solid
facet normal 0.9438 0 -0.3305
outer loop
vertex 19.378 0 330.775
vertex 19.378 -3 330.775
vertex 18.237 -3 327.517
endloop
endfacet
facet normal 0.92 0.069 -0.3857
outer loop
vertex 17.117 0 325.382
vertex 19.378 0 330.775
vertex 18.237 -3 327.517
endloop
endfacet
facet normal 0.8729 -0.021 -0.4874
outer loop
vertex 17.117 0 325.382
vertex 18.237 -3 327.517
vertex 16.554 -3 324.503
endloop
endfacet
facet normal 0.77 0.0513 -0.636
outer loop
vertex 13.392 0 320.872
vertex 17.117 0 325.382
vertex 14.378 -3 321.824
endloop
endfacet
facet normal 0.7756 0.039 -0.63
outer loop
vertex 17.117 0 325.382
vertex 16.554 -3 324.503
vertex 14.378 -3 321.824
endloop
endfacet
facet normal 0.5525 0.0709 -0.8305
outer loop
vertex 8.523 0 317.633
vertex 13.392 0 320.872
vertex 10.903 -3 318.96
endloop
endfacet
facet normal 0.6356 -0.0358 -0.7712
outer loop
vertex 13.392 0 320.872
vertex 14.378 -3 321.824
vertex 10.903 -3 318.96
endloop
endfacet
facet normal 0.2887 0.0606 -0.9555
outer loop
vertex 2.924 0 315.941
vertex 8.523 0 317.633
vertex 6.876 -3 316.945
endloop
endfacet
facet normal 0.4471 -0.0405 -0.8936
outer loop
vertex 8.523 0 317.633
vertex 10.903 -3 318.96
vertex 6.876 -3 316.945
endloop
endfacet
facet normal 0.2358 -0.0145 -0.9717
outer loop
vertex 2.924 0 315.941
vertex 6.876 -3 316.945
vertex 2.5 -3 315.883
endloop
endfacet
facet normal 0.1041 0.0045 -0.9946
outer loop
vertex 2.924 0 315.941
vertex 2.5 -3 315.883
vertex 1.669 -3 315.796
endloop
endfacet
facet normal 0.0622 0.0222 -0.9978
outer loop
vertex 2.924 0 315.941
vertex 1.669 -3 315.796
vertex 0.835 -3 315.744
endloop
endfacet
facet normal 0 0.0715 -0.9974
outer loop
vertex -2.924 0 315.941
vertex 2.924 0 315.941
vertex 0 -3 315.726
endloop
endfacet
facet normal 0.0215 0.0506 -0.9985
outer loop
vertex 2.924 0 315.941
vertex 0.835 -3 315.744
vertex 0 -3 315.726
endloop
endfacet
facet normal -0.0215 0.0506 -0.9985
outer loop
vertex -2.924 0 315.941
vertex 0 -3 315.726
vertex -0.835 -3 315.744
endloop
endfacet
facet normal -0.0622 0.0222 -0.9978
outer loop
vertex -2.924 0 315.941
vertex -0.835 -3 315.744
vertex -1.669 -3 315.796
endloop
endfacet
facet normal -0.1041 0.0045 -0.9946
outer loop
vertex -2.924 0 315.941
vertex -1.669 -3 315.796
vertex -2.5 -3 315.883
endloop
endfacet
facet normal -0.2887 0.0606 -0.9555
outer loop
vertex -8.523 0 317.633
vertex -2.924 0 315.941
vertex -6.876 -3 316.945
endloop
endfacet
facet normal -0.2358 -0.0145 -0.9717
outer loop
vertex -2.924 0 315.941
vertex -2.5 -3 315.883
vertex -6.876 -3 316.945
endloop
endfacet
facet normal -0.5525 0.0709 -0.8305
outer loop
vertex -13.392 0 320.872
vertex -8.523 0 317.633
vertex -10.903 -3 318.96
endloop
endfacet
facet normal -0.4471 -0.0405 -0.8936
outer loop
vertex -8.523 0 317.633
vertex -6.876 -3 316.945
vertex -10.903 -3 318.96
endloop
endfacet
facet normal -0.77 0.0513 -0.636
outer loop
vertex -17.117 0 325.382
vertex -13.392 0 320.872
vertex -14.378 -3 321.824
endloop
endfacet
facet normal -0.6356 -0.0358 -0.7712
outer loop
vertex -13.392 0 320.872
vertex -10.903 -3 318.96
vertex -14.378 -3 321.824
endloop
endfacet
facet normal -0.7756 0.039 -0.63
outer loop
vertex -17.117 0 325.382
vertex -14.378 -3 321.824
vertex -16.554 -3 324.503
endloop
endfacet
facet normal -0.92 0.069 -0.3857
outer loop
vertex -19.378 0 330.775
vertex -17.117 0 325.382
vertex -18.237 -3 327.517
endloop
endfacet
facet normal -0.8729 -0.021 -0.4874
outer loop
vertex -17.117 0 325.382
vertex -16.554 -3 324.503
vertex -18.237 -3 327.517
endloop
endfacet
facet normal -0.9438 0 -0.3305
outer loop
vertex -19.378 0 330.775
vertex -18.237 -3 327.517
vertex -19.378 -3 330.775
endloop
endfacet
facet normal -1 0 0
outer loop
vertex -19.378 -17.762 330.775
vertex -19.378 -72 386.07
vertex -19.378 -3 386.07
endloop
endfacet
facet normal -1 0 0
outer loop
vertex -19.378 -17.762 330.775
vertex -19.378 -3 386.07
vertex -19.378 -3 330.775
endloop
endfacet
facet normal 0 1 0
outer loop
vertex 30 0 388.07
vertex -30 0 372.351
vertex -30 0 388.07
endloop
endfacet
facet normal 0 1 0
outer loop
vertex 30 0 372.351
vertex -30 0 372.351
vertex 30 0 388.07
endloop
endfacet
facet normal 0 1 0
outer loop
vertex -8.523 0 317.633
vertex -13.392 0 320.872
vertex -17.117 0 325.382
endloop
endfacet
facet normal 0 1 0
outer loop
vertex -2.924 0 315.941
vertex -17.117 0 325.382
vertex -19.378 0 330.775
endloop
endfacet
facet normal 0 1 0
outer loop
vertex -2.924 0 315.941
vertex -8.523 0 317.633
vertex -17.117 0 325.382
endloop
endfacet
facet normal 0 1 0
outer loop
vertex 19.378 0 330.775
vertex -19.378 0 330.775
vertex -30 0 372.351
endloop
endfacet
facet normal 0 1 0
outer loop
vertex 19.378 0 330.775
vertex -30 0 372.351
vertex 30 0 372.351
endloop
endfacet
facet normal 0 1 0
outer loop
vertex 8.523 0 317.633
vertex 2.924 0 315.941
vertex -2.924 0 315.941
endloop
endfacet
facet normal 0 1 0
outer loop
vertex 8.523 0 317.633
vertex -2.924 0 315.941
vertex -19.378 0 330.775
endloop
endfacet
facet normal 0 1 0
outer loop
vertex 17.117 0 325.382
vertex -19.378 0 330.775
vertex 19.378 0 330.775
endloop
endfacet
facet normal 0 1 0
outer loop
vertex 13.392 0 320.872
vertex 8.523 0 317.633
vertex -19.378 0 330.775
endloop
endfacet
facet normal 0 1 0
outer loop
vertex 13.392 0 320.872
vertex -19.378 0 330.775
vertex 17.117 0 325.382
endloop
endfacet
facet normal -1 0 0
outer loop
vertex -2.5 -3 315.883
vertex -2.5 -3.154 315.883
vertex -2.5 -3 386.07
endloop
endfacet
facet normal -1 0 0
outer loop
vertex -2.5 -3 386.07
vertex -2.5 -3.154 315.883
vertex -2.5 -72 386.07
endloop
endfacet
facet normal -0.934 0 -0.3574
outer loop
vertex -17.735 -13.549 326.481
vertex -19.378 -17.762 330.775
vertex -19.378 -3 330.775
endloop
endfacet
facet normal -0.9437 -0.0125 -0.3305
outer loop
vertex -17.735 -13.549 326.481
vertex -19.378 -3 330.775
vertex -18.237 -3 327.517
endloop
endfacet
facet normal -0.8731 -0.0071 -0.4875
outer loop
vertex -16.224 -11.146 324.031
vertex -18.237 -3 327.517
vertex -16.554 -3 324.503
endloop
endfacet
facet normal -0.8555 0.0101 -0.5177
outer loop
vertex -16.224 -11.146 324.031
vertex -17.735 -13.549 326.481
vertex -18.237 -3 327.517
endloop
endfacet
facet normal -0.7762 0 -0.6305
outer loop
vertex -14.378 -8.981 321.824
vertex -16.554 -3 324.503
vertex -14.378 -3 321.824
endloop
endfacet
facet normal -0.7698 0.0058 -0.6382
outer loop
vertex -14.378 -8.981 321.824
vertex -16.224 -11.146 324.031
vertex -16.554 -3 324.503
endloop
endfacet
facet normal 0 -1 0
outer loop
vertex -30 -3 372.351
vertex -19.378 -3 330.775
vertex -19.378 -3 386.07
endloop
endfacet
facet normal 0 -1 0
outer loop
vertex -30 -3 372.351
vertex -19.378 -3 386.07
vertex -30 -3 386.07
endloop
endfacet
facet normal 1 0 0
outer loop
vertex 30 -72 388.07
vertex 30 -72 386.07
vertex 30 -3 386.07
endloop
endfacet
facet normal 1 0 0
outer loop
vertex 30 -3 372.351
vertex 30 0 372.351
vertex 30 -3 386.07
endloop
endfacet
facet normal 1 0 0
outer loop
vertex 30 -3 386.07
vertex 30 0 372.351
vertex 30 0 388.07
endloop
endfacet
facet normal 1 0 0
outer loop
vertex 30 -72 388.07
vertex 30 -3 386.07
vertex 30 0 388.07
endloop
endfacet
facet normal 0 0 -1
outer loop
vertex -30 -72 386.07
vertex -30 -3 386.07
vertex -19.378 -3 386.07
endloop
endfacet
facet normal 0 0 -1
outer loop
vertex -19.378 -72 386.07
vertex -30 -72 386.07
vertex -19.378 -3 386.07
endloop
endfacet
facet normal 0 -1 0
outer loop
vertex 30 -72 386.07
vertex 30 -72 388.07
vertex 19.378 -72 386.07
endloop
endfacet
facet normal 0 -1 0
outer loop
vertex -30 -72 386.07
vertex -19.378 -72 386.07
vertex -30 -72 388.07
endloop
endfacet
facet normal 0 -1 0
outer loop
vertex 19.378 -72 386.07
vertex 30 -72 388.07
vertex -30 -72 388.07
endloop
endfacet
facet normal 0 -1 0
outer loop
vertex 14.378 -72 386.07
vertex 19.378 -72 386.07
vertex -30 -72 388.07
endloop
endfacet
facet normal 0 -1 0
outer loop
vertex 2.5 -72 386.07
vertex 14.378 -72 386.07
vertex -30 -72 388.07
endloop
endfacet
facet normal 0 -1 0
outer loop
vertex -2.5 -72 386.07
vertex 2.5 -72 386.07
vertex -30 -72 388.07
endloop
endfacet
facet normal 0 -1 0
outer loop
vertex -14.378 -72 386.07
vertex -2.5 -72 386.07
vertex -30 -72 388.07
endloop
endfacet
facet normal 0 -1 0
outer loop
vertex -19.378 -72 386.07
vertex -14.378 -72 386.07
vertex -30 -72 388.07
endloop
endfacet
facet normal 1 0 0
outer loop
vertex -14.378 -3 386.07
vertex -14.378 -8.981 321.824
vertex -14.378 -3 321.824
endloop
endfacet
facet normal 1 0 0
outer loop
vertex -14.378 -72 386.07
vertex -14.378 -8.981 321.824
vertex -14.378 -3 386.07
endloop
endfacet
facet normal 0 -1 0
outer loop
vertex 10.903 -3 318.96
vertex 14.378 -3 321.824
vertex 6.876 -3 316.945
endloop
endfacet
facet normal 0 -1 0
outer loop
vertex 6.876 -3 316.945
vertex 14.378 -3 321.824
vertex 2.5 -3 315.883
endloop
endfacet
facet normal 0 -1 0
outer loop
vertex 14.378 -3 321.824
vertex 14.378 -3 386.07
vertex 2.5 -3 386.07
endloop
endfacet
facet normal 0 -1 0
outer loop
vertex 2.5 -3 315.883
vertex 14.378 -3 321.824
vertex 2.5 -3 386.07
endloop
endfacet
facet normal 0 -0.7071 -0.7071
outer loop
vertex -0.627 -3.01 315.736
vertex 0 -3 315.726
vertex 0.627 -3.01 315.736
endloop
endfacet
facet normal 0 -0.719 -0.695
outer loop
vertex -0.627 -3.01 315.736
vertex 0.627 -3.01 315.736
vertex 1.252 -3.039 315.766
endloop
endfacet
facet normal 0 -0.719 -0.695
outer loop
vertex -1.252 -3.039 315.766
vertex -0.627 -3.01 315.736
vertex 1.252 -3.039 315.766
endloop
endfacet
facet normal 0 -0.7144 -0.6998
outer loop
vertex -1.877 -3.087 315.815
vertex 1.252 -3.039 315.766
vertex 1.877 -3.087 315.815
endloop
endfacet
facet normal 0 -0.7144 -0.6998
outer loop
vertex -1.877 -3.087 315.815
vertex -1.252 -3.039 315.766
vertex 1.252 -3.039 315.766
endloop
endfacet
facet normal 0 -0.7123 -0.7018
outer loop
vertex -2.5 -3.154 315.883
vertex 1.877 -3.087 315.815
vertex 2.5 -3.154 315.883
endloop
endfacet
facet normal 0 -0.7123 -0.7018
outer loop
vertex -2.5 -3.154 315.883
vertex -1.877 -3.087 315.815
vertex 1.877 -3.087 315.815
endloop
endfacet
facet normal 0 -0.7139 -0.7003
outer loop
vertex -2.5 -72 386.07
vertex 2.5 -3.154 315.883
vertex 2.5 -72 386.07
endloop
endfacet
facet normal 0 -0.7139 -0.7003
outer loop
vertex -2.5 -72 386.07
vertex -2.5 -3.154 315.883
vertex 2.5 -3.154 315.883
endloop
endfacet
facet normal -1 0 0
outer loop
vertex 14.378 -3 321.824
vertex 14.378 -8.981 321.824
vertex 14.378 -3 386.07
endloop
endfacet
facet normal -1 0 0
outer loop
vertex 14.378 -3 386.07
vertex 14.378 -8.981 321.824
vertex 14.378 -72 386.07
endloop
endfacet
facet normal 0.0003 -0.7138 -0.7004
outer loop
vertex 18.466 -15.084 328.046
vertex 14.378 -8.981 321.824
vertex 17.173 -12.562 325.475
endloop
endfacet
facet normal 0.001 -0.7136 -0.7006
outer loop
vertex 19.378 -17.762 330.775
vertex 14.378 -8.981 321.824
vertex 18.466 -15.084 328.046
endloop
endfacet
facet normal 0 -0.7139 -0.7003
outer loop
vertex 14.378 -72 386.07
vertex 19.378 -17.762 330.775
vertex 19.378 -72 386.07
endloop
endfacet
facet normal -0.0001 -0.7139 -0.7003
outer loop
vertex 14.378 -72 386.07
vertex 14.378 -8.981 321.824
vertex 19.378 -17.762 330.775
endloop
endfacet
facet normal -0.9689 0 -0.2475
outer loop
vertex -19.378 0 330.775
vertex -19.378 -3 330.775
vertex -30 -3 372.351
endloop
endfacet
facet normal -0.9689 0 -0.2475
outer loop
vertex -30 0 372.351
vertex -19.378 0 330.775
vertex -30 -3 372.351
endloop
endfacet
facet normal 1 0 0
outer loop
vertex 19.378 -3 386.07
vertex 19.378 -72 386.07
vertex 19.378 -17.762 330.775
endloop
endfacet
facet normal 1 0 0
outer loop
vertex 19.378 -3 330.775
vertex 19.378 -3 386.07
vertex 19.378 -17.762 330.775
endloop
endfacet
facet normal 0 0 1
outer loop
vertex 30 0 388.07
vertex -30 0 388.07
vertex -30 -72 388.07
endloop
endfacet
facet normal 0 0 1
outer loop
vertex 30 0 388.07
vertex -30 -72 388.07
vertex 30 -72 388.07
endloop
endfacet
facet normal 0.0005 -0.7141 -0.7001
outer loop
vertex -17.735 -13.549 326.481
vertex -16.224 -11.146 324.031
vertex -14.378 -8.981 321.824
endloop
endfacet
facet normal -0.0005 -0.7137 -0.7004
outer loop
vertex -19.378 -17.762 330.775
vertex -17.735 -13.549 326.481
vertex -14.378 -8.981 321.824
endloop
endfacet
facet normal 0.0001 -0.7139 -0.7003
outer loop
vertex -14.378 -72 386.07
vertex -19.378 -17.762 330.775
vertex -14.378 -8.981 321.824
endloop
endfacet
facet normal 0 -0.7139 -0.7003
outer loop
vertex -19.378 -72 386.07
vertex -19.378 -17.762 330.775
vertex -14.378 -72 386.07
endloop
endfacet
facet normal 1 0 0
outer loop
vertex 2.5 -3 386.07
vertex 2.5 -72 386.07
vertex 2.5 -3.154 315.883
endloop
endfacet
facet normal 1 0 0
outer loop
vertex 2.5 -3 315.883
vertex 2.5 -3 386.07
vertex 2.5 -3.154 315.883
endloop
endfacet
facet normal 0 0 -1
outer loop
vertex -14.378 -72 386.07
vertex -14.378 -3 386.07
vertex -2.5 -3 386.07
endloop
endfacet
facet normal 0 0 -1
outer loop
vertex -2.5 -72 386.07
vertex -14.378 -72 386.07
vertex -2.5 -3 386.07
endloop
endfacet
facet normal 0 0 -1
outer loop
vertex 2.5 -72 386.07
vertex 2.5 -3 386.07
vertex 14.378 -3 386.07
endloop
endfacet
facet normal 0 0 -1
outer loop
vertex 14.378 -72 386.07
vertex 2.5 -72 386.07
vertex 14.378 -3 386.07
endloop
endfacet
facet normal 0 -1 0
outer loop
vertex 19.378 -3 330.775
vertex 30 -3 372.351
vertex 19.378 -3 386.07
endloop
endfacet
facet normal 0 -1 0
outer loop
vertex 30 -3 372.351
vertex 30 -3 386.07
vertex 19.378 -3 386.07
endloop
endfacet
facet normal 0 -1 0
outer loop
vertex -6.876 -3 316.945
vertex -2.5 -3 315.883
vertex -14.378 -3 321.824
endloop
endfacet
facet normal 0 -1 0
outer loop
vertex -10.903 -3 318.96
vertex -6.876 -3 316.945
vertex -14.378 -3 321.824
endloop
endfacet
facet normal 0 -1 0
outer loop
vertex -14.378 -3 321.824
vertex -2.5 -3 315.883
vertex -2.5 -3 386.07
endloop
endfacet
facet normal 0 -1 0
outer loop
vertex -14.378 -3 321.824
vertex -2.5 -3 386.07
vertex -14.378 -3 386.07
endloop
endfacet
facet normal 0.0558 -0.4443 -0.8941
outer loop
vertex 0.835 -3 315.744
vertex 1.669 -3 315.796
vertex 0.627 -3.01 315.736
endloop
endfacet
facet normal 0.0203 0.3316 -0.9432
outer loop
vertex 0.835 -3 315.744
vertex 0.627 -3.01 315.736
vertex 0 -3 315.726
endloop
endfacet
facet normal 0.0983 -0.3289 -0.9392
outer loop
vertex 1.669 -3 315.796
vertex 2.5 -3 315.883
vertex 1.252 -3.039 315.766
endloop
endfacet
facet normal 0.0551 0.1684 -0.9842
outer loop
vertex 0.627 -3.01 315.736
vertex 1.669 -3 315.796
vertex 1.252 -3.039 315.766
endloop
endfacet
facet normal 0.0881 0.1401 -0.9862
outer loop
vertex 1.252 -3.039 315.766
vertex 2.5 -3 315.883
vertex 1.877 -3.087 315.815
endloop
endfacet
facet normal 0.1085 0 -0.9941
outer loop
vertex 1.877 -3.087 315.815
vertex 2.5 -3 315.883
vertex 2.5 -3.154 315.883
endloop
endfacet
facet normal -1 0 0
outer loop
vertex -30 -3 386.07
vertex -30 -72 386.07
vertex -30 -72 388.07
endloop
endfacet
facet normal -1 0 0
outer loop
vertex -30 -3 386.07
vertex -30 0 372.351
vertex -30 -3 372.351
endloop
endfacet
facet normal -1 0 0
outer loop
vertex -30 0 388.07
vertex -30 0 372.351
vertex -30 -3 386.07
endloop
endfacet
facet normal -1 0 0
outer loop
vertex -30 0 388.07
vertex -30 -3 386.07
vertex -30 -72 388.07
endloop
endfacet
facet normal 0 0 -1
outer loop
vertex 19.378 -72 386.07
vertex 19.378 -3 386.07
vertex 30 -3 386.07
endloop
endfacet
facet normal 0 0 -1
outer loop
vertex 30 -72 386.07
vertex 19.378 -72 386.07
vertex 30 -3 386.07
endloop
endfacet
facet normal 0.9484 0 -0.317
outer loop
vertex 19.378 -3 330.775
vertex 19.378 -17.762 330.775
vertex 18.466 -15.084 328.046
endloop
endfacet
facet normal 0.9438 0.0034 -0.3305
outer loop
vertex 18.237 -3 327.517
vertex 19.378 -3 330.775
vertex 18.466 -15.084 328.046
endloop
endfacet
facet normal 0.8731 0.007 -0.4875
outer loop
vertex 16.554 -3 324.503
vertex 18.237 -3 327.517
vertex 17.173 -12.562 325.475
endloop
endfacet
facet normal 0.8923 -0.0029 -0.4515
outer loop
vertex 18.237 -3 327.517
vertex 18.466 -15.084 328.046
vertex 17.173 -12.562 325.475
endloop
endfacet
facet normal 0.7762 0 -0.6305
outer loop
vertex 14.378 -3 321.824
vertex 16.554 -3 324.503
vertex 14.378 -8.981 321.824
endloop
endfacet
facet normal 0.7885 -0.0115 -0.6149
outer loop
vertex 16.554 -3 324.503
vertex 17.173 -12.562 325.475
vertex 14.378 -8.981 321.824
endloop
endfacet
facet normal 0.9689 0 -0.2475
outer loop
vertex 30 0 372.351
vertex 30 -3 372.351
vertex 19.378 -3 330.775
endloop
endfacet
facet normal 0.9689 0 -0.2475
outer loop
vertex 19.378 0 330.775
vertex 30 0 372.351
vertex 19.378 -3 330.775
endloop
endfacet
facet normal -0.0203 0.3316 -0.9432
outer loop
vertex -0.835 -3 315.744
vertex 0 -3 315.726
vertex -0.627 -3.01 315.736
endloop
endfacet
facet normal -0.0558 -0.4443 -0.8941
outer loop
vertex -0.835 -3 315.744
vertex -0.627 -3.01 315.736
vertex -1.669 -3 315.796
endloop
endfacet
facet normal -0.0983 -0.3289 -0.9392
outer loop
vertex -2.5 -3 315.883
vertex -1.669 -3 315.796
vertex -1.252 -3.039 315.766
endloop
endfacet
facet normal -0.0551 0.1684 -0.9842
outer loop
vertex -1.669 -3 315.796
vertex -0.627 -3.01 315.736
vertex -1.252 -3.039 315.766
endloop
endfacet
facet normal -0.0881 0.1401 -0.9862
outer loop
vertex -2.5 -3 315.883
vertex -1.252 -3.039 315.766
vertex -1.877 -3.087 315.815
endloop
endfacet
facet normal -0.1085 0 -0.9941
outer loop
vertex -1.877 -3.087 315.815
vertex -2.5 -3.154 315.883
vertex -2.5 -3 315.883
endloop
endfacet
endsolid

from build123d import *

# Parameters (mm, degrees)
BOSS_EXTRUDE1_DEPTH     = 15
BOSS_EXTRUDE2_DEPTH     = 10
SKETCH3_R               = 3.25
CUT_EXTRUDE1_DEPTH      = 9
CUT_EXTRUDE2_START      = -7
SKETCH4_R               = 6
CUT_EXTRUDE2_DEPTH      = 7
CHAMFER1_START          = 3
CHAMFER1_2_DEPTH        = 7
CHAMFER1_3_OUTLINE_R    = 12
CHAMFER1_3_OUTLINE_R_2  = 6
CHAMFER1_3_DEPTH        = 7
CHAMFER2_SIZE           = 5
CHAMFER2_SIZE2          = 3
SKETCH5_W               = 22
SKETCH5_H               = 32.792874394
CUT_EXTRUDE3_DEPTH      = 12
FILLET1_R               = 10
FILLET2_R               = 10
BOSS_EXTRUDE3_START     = 3
BOSS_EXTRUDE3_DEPTH     = 3
SKETCH7_W               = 60
SKETCH7_H               = 2
BOSS_EXTRUDE4_DEPTH     = 69
SKETCH8_W               = 60
SKETCH8_H               = 92.343979927
CUT_EXTRUDE4_DEPTH      = 416.45813754
BOSS_EXTRUDE5_START     = 69
BOSS_EXTRUDE5_DEPTH     = 69
CUT_EXTRUDE5_DEPTH      = 396.831589728
CUT_EXTRUDE5_DEPTH_BACK = 396.831589728


with BuildPart() as part:
    # Sketch1 → Boss-Extrude1 (new body)
    with BuildSketch(Plane(origin=(0, 0, 0), x_dir=(1, 0, 0), z_dir=(0, 1, 0))):
        with BuildLine():
            Line((-30, -408.070415552), (30, -408.070415552))
            Line((30, -408.070415552), (30, -372.350901436))
            ThreePointArc((30, -372.350901436), (0, -375.726435625), (-30, -372.350901436))
            Line((-30, -372.350901436), (-30, -408.070415552))
        make_face()
        with BuildLine():
            Line((-21, -395.210658494), (-21, -385.210658494))
            ThreePointArc((-21, -385.210658494), (-23, -383.210658494), (-25, -385.210658494))
            Line((-25, -385.210658494), (-25, -395.210658494))
            ThreePointArc((-25, -395.210658494), (-23, -397.210658494), (-21, -395.210658494))
        make_face(mode=Mode.SUBTRACT)
        with BuildLine():
            Line((25, -385.210658494), (25, -395.210658494))
            ThreePointArc((25, -395.210658494), (23, -397.210658494), (21, -395.210658494))
            Line((21, -395.210658494), (21, -385.210658494))
            ThreePointArc((21, -385.210658494), (23, -383.210658494), (25, -385.210658494))
        make_face(mode=Mode.SUBTRACT)
    extrude(amount=BOSS_EXTRUDE1_DEPTH)

    # Sketch2 → Boss-Extrude2 (add)
    with BuildSketch(Plane(origin=(0, 0, 0), x_dir=(1, 0, 0), z_dir=(0, 1, 0))):
        with BuildLine():
            Line((30, -372.350901436), (19.377517729, -330.775495649))
            ThreePointArc((19.377517729, -330.775495649), (0, -315.726435625), (-19.377517729, -330.775495649))
            Line((-19.377517729, -330.775495649), (-30, -372.350901436))
            ThreePointArc((-30, -372.350901436), (0, -375.726435625), (30, -372.350901436))
        make_face()
    extrude(amount=BOSS_EXTRUDE2_DEPTH)

    # Sketch3 → Cut-Extrude1 (cut)
    with BuildSketch(Plane(origin=(0, 10, 0), x_dir=(1, 0, 0), z_dir=(0, 1, 0))):
        with Locations(Location((0, -335.726435625, 0), (0, 0, 270))):
            Circle(SKETCH3_R)
    extrude(amount=-CUT_EXTRUDE1_DEPTH, mode=Mode.SUBTRACT)

    # Sketch4 → Cut-Extrude2 (cut)
    with BuildSketch(Plane(origin=(0, 10, 0), x_dir=(1, 0, 0), z_dir=(0, 1, 0)).offset(CUT_EXTRUDE2_START)):
        with BuildLine():
            Line((30, -372.350901436), (19.377517729, -330.775495649))
            ThreePointArc((19.377517729, -330.775495649), (0, -315.726435625), (-19.377517729, -330.775495649))
            Line((-19.377517729, -330.775495649), (-30, -372.350901436))
            ThreePointArc((-30, -372.350901436), (0, -375.726435625), (30, -372.350901436))
        make_face()
        with Locations(Location((0, -335.726435625, 0), (0, 0, 270))):
            Circle(SKETCH4_R, mode=Mode.SUBTRACT)
    extrude(amount=CUT_EXTRUDE2_DEPTH, mode=Mode.SUBTRACT)

    # Chamfer1: read off the stored shape, not the designer's step
    # Chamfer1 outline → Chamfer1 (revolve)
    with BuildSketch(Plane.XY.offset(335.726435625)):
        Polygon((26, 3), (12, 10), (12, 3), align=None)
    revolve(axis=Axis((0, 0, 335.726435625), (0, 1, 0)))

    # Chamfer1 2 outline → Chamfer1 2 (cut)
    with BuildSketch(Plane(origin=(0, 0, 0), x_dir=(1, 0, 0), z_dir=(0, 1, 0)).offset(CHAMFER1_START)):
        with BuildLine():
            ThreePointArc((-19.377517729, -330.775495649), (0, -315.726435625), (19.377517729, -330.775495649))
            Line((19.377517729, -330.775495649), (24.033863727, -349))
            Line((24.033863727, -349), (27, -349))
            Line((27, -349), (27, -308))
            Line((27, -308), (-27, -308))
            Line((-27, -308), (-27, -349))
            Line((-27, -349), (-24.033863727, -349))
            Line((-24.033863727, -349), (-19.377517729, -330.775495649))
        make_face()
    extrude(amount=CHAMFER1_2_DEPTH, mode=Mode.SUBTRACT)

    # Chamfer1 3 outline → Chamfer1 3 (add)
    with BuildSketch(Plane(origin=(0, 0, 0), x_dir=(1, 0, 0), z_dir=(0, 1, 0)).offset(CHAMFER1_START)):
        with Locations((0, -335.726435625)):
            Circle(CHAMFER1_3_OUTLINE_R)
        with Locations((0, -335.726435625)):
            Circle(CHAMFER1_3_OUTLINE_R_2, mode=Mode.SUBTRACT)
    extrude(amount=CHAMFER1_3_DEPTH)

    # Chamfer2
    chamfer2_edges = [part.edges().sort_by_distance(p)[0] for p in [
        (0, 10, 332.476435625),
    ]]
    chamfer2_side = [part.faces().sort_by_distance(p)[0] for p in [
        (-11.660588745, 10, 335.726435625),
    ]]
    chamfer(chamfer2_edges, length=CHAMFER2_SIZE, length2=CHAMFER2_SIZE2, reference=chamfer2_side[0])

    # Sketch5 → Cut-Extrude3 (cut)
    with BuildSketch(Plane(origin=(0, 15, 0), x_dir=(1, 0, 0), z_dir=(0, 1, 0))):
        with Locations((0, -391.673978355)):
            Rectangle(SKETCH5_W, SKETCH5_H)
    extrude(amount=-CUT_EXTRUDE3_DEPTH, mode=Mode.SUBTRACT)

    # Fillet1
    fillet1_edges = [part.edges().sort_by_distance(p)[0] for p in [
        (-11, 9, 375.277541158),
        (11, 9, 375.277541158),
    ]]
    fillet(fillet1_edges, radius=FILLET1_R)

    # Fillet2
    fillet2_edges = [part.edges().sort_by_distance(p)[0] for p in [
        (30, 7.5, 408.070415552),
        (-30, 7.5, 408.070415552),
    ]]
    fillet(fillet2_edges, radius=FILLET2_R)

    # Sketch6 → Boss-Extrude3 (add)
    with BuildSketch(Plane.XZ.offset(BOSS_EXTRUDE3_START)):
        with BuildLine():
            Line((-30, 388.070415552), (30, 388.070415552))
            Line((30, 388.070415552), (30, 372.350901436))
            Line((30, 372.350901436), (19.377517729, 330.775495649))
            ThreePointArc((19.377517729, 330.775495649), (0, 315.726435625), (-19.377517729, 330.775495649))
            Line((-19.377517729, 330.775495649), (-30, 372.350901436))
            Line((-30, 372.350901436), (-30, 388.070415552))
        make_face()
    extrude(amount=-BOSS_EXTRUDE3_DEPTH)

    # Sketch7 → Boss-Extrude4 (add)
    with BuildSketch(Plane.XZ.offset(3)):
        with Locations((0, 387.070415552)):
            Rectangle(SKETCH7_W, SKETCH7_H)
    extrude(amount=BOSS_EXTRUDE4_DEPTH)

    # Sketch8 → Cut-Extrude4 (cut, through all)
    with BuildSketch(Plane(origin=(0, 0, 0), x_dir=(1, 0, 0), z_dir=(0, 1, 0))):
        with Locations((0, -361.898425589)):
            Rectangle(SKETCH8_W, SKETCH8_H)
    extrude(amount=CUT_EXTRUDE4_DEPTH, mode=Mode.SUBTRACT)

    # Sketch9 → Boss-Extrude5 (add)
    with BuildSketch(Plane.XZ.offset(3).offset(BOSS_EXTRUDE5_START)):
        with BuildLine():
            Line((-2.5, 386.070415552), (2.5, 386.070415552))
            Line((2.5, 386.070415552), (2.5, 315.883300792))
            ThreePointArc((2.5, 315.883300792), (0, 315.726435625), (-2.5, 315.883300792))
            Line((-2.5, 315.883300792), (-2.5, 386.070415552))
        make_face()
        with BuildLine():
            Line((14.377517729, 386.070415552), (19.377517729, 386.070415552))
            Line((19.377517729, 386.070415552), (19.377517729, 330.775495649))
            ThreePointArc((19.377517729, 330.775495649), (17.460939697, 325.973713704), (14.377517729, 321.823666695))
            Line((14.377517729, 321.823666695), (14.377517729, 386.070415552))
        make_face()
        with BuildLine():
            Line((-19.377517729, 386.070415552), (-19.377517729, 330.775495649))
            ThreePointArc((-19.377517729, 330.775495649), (-17.460939697, 325.973713704), (-14.377517729, 321.823666695))
            Line((-14.377517729, 321.823666695), (-14.377517729, 386.070415552))
            Line((-14.377517729, 386.070415552), (-19.377517729, 386.070415552))
        make_face()
    extrude(amount=-BOSS_EXTRUDE5_DEPTH)

    # Sketch10 → Cut-Extrude5 (cut, two sides: drawn at the far end of the back side and taken through both)
    with BuildSketch(Plane(origin=(0, 0, 0), x_dir=(0, 0, -1), z_dir=(1, 0, 0)).offset(-CUT_EXTRUDE5_DEPTH_BACK)):
        Polygon((-386.070415552, -72), (-315.726435625, -72), (-315.726435625, -3), align=None)
    extrude(amount=CUT_EXTRUDE5_DEPTH + CUT_EXTRUDE5_DEPTH_BACK, mode=Mode.SUBTRACT)


solid = part.part
